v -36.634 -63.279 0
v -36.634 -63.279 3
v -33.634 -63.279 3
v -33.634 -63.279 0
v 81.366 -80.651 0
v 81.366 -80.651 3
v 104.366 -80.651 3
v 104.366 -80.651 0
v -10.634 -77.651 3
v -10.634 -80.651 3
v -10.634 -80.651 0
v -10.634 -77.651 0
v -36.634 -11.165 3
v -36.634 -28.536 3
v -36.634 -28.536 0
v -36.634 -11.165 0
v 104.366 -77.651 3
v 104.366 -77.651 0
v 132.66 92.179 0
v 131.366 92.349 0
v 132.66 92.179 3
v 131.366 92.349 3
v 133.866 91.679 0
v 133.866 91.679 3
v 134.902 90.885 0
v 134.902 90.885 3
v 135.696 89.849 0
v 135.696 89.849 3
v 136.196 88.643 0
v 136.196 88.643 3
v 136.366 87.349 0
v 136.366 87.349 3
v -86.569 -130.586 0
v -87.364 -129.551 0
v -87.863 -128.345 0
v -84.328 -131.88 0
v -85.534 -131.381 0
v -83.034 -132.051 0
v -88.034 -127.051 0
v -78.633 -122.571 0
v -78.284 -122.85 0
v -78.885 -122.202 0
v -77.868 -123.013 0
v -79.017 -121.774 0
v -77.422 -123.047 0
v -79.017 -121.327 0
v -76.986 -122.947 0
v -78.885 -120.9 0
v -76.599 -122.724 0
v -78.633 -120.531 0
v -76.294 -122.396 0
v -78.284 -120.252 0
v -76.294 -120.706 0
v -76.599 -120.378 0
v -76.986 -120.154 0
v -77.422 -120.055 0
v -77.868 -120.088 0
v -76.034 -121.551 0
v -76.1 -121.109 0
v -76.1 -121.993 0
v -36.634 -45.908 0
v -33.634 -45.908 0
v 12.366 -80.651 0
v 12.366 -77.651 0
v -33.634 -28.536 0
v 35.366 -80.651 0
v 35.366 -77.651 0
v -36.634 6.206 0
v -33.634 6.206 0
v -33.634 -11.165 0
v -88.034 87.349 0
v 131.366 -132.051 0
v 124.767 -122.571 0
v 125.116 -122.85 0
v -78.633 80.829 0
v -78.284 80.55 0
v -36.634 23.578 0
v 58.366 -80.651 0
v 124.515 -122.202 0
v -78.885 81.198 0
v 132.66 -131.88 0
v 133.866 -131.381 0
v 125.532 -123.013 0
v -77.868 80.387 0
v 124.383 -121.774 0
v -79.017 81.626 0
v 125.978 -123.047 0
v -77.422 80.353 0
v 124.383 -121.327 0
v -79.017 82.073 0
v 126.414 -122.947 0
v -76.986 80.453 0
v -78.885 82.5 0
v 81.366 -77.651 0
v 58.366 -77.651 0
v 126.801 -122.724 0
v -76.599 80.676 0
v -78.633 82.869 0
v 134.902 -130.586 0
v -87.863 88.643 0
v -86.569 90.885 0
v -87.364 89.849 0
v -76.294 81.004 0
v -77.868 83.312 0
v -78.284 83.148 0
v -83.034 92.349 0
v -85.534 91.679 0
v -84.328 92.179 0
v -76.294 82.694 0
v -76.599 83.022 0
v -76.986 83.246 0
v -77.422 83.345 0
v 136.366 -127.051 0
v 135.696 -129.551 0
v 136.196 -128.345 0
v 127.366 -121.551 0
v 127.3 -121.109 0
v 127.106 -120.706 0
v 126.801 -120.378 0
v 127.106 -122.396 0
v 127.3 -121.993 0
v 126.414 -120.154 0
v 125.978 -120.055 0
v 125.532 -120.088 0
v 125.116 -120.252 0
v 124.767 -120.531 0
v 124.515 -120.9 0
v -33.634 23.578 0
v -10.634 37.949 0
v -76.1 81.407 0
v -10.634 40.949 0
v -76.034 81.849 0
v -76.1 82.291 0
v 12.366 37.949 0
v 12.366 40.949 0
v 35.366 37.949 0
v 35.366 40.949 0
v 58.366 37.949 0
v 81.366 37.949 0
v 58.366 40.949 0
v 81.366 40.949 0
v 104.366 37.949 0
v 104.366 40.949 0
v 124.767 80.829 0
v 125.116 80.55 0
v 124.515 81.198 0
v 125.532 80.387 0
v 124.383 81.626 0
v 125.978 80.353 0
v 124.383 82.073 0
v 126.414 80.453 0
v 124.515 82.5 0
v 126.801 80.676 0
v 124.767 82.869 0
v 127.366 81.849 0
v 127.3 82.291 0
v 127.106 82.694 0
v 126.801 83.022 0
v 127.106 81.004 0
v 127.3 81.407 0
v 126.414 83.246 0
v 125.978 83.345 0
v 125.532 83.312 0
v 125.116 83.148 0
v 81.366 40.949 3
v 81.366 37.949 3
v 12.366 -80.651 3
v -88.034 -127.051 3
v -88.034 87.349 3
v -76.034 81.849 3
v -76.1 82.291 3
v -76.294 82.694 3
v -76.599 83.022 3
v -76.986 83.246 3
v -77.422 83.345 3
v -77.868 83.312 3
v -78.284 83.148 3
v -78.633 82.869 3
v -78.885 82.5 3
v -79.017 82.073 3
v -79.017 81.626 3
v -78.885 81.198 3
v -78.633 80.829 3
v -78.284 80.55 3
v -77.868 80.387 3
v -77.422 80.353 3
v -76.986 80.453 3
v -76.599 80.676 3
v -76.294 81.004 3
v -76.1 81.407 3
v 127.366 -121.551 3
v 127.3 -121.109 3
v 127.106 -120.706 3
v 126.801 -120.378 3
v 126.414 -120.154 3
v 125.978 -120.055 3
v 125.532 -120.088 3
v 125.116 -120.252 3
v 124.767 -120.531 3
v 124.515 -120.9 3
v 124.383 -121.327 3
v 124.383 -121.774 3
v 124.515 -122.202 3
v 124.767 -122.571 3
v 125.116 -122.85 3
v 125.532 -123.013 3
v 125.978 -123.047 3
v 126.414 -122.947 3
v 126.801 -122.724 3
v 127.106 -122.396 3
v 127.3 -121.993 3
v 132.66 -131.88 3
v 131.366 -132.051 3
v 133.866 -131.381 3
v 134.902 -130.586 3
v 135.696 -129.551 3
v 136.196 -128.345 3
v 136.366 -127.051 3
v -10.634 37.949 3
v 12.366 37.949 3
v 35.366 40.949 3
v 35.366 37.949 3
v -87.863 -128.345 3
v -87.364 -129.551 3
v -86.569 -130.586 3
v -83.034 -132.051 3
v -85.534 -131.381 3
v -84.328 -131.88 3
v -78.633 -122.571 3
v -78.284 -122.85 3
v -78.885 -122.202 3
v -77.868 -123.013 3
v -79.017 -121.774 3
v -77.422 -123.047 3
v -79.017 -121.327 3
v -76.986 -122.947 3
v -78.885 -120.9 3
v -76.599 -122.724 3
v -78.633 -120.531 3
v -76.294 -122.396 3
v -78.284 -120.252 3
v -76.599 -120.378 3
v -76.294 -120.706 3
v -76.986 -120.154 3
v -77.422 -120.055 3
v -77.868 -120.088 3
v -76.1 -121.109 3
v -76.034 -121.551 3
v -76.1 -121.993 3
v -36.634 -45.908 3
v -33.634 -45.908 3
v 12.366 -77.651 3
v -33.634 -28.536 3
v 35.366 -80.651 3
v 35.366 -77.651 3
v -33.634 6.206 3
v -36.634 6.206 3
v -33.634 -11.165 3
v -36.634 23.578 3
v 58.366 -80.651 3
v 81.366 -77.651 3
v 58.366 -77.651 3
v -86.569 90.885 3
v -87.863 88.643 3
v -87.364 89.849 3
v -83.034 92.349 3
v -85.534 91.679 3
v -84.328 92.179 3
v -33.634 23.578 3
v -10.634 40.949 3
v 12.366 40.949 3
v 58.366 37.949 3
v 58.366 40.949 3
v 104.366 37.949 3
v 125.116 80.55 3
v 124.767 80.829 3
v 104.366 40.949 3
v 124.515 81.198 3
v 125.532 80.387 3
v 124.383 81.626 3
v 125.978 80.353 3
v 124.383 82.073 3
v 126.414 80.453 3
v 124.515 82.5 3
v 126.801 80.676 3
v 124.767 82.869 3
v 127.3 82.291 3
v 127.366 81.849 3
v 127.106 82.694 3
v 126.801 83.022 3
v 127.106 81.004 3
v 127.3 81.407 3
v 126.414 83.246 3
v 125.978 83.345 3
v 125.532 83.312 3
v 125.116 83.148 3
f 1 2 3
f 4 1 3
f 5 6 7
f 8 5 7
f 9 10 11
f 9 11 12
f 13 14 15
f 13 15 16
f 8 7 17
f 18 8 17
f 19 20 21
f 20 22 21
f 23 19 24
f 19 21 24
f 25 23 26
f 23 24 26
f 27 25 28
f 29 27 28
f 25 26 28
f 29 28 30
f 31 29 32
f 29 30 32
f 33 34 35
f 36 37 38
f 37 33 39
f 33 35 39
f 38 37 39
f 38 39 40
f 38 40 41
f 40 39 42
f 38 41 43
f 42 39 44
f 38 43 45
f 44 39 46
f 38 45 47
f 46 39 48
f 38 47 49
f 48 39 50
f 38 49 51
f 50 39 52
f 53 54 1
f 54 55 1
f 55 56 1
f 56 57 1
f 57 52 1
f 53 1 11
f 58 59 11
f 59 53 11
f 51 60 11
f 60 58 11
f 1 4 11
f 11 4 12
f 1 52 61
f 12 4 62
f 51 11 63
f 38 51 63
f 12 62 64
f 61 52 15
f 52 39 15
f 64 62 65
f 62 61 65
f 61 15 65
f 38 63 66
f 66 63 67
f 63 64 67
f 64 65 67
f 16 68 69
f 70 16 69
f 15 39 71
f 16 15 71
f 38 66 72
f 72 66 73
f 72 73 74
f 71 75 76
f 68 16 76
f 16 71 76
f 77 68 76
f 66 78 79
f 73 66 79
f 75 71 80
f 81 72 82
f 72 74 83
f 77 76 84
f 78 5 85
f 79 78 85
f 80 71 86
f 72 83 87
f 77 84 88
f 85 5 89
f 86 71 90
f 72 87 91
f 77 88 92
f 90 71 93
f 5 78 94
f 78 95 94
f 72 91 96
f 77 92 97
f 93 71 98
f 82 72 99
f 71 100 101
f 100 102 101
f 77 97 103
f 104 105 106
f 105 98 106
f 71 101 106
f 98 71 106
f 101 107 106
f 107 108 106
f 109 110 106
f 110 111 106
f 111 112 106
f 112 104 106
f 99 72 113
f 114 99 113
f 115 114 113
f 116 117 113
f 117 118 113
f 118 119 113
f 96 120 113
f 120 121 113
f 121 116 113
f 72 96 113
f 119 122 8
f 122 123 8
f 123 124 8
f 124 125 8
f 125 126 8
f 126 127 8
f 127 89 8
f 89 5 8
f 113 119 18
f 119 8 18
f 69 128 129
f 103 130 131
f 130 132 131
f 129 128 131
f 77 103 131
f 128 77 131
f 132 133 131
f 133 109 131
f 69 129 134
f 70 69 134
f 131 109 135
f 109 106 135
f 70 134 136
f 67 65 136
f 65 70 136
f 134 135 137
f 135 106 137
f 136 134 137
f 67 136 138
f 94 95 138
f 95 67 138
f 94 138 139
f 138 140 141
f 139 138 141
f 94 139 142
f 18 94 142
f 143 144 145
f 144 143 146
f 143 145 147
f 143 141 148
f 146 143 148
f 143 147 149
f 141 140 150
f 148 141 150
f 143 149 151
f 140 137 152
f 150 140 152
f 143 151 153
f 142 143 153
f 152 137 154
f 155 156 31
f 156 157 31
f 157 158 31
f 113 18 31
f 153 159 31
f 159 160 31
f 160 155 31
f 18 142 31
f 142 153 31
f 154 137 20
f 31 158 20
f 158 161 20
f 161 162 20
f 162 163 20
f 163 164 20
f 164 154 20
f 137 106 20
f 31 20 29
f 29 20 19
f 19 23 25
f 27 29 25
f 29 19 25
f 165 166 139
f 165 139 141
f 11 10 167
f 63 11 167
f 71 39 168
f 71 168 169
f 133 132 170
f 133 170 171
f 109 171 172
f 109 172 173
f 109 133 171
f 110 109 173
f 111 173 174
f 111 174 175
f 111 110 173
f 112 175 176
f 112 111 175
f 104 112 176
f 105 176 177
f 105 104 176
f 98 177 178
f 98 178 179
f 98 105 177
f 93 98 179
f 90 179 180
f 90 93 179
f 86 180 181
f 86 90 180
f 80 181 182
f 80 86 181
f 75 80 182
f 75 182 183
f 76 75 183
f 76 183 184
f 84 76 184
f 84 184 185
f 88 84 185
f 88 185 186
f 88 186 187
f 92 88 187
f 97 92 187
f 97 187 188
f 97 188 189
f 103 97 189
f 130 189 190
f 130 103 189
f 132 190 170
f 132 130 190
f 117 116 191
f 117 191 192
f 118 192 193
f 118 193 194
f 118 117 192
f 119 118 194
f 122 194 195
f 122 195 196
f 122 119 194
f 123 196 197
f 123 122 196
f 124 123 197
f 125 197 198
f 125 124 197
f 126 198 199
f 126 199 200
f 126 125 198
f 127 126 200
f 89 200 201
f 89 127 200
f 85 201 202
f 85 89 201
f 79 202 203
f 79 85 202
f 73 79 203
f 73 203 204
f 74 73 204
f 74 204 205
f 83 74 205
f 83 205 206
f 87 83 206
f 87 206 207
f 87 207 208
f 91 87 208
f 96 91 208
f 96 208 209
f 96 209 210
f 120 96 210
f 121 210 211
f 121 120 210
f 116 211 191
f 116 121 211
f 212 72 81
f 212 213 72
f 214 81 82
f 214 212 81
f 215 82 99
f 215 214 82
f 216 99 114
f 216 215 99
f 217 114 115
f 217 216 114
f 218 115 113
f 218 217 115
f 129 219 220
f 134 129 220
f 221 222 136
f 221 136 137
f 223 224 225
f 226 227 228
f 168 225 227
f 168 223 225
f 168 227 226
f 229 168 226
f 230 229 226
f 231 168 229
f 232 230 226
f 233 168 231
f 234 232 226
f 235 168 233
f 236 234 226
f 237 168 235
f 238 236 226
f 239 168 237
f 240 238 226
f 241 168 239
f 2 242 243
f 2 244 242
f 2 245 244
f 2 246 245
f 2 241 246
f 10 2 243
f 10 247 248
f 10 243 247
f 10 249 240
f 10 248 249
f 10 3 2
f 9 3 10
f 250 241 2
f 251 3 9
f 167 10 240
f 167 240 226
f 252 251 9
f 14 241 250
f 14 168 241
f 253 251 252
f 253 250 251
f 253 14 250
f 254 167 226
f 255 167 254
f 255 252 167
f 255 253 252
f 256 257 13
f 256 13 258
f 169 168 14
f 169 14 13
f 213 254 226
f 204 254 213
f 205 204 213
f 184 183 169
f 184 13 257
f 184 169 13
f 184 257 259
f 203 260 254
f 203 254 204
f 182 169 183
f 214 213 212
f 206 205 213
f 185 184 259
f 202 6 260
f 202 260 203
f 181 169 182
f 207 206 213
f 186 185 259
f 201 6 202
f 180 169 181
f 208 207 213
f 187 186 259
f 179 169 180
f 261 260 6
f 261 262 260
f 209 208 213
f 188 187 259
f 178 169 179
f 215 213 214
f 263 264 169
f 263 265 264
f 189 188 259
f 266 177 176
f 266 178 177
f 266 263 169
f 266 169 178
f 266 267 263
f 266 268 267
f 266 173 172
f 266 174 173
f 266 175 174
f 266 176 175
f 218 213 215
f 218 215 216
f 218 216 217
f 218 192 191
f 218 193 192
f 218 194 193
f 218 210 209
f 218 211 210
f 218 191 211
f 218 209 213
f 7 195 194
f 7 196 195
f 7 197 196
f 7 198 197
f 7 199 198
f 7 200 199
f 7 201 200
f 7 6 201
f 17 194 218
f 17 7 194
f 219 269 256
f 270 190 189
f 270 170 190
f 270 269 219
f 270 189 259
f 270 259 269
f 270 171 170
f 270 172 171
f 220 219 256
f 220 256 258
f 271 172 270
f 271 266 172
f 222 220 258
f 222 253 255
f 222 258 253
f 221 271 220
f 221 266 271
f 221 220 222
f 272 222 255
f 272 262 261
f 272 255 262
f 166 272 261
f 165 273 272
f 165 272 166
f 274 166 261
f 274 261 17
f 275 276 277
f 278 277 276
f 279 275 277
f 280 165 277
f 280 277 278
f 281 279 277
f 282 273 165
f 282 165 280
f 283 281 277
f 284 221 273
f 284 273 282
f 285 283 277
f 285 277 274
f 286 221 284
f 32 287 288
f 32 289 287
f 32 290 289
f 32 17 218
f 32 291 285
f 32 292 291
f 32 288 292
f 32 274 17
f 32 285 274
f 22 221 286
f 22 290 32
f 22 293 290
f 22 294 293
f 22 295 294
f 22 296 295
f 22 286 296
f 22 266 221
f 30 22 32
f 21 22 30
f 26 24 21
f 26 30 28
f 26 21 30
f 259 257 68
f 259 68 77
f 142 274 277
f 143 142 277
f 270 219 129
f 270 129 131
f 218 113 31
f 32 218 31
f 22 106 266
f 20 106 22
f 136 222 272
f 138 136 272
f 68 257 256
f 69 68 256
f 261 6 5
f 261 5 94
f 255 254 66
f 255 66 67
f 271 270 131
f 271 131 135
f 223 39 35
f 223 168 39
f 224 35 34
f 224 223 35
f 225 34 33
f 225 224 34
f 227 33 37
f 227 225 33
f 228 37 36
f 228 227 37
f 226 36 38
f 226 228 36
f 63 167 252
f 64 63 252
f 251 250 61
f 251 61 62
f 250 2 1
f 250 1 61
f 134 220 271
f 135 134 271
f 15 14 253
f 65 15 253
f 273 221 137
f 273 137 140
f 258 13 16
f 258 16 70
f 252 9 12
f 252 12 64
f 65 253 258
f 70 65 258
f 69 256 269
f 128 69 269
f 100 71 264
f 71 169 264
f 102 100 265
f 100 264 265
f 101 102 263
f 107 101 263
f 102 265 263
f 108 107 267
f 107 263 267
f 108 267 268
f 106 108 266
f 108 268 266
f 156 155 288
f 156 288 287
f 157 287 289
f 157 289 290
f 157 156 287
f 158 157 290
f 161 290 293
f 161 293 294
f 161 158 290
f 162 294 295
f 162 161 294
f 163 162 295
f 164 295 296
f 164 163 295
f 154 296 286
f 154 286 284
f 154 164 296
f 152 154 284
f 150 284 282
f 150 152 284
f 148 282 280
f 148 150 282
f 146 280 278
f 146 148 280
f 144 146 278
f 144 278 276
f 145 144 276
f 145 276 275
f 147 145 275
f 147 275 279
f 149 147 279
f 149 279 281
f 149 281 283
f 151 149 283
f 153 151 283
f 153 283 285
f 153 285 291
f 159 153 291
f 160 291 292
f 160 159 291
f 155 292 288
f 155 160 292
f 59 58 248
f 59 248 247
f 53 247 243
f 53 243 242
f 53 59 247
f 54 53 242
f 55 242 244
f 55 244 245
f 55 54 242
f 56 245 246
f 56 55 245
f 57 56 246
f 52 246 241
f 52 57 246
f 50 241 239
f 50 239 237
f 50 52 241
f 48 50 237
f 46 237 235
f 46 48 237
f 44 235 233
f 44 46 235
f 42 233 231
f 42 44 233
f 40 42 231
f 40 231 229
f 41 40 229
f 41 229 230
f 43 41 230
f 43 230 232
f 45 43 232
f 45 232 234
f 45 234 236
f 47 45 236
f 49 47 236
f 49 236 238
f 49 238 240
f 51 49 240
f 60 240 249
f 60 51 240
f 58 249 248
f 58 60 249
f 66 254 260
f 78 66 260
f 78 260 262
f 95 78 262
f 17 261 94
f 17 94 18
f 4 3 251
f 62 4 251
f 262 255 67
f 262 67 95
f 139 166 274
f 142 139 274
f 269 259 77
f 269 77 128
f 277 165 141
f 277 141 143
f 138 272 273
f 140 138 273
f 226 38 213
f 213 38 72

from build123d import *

# Parameters (mm, degrees)
SKETCH1_W           = 224.4
SKETCH1_H           = 224.4
SKETCH1_R           = 1.5
BOSS_EXTRUDE1_DEPTH = 3
FILLET2_R           = 5
SKETCH3_W           = 23
SKETCH3_H           = 3
SKETCH3_W_2         = 3
SKETCH3_H_2         = 17.37142857
CUT_EXTRUDE1_DEPTH  = 4


with BuildPart() as part:
    # Sketch1 → Boss-Extrude1 (new body)
    with BuildSketch(Plane.XY):
        with Locations((24.166161027, -19.850775129)):
            Rectangle(SKETCH1_W, SKETCH1_H)
        with Locations((125.866161027, -121.550775129)):
            Circle(SKETCH1_R, mode=Mode.SUBTRACT)
        with Locations((125.866161027, 81.849224871)):
            Circle(SKETCH1_R, mode=Mode.SUBTRACT)
        with Locations((-77.533838973, -121.550775129)):
            Circle(SKETCH1_R, mode=Mode.SUBTRACT)
        with Locations((-77.533838973, 81.849224871)):
            Circle(SKETCH1_R, mode=Mode.SUBTRACT)
    extrude(amount=BOSS_EXTRUDE1_DEPTH)

    # Fillet2
    fillet2_edges = [part.edges().sort_by_distance(p)[0] for p in [
        (-88.033838973, 92.349224871, 1.5),
        (136.366161027, 92.349224871, 1.5),
        (136.366161027, -132.050775129, 1.5),
        (-88.033838973, -132.050775129, 1.5),
    ]]
    fillet(fillet2_edges, radius=FILLET2_R)

    # Sketch3 → Cut-Extrude1 (cut, through all)
    with BuildSketch(Plane.XY.offset(3)):
        with Locations((92.866161027, 39.449224871)):
            Rectangle(SKETCH3_W, SKETCH3_H)
        with Locations((46.866161027, 39.449224871)):
            Rectangle(SKETCH3_W, SKETCH3_H)
        with Locations((0.866161027, 39.449224871)):
            Rectangle(SKETCH3_W, SKETCH3_H)
        with Locations((-35.133838973, 14.892082014)):
            Rectangle(SKETCH3_W_2, SKETCH3_H_2)
        with Locations((-35.133838973, -19.850775126)):
            Rectangle(SKETCH3_W_2, SKETCH3_H_2)
        with Locations((-35.133838973, -54.593632266)):
            Rectangle(SKETCH3_W_2, SKETCH3_H_2)
        with Locations((0.866161027, -79.150775129)):
            Rectangle(SKETCH3_W, SKETCH3_H)
        with Locations((46.866161027, -79.150775129)):
            Rectangle(SKETCH3_W, SKETCH3_H)
        with Locations((92.866161027, -79.150775129)):
            Rectangle(SKETCH3_W, SKETCH3_H)
    extrude(amount=-CUT_EXTRUDE1_DEPTH, mode=Mode.SUBTRACT)


solid = part.part
